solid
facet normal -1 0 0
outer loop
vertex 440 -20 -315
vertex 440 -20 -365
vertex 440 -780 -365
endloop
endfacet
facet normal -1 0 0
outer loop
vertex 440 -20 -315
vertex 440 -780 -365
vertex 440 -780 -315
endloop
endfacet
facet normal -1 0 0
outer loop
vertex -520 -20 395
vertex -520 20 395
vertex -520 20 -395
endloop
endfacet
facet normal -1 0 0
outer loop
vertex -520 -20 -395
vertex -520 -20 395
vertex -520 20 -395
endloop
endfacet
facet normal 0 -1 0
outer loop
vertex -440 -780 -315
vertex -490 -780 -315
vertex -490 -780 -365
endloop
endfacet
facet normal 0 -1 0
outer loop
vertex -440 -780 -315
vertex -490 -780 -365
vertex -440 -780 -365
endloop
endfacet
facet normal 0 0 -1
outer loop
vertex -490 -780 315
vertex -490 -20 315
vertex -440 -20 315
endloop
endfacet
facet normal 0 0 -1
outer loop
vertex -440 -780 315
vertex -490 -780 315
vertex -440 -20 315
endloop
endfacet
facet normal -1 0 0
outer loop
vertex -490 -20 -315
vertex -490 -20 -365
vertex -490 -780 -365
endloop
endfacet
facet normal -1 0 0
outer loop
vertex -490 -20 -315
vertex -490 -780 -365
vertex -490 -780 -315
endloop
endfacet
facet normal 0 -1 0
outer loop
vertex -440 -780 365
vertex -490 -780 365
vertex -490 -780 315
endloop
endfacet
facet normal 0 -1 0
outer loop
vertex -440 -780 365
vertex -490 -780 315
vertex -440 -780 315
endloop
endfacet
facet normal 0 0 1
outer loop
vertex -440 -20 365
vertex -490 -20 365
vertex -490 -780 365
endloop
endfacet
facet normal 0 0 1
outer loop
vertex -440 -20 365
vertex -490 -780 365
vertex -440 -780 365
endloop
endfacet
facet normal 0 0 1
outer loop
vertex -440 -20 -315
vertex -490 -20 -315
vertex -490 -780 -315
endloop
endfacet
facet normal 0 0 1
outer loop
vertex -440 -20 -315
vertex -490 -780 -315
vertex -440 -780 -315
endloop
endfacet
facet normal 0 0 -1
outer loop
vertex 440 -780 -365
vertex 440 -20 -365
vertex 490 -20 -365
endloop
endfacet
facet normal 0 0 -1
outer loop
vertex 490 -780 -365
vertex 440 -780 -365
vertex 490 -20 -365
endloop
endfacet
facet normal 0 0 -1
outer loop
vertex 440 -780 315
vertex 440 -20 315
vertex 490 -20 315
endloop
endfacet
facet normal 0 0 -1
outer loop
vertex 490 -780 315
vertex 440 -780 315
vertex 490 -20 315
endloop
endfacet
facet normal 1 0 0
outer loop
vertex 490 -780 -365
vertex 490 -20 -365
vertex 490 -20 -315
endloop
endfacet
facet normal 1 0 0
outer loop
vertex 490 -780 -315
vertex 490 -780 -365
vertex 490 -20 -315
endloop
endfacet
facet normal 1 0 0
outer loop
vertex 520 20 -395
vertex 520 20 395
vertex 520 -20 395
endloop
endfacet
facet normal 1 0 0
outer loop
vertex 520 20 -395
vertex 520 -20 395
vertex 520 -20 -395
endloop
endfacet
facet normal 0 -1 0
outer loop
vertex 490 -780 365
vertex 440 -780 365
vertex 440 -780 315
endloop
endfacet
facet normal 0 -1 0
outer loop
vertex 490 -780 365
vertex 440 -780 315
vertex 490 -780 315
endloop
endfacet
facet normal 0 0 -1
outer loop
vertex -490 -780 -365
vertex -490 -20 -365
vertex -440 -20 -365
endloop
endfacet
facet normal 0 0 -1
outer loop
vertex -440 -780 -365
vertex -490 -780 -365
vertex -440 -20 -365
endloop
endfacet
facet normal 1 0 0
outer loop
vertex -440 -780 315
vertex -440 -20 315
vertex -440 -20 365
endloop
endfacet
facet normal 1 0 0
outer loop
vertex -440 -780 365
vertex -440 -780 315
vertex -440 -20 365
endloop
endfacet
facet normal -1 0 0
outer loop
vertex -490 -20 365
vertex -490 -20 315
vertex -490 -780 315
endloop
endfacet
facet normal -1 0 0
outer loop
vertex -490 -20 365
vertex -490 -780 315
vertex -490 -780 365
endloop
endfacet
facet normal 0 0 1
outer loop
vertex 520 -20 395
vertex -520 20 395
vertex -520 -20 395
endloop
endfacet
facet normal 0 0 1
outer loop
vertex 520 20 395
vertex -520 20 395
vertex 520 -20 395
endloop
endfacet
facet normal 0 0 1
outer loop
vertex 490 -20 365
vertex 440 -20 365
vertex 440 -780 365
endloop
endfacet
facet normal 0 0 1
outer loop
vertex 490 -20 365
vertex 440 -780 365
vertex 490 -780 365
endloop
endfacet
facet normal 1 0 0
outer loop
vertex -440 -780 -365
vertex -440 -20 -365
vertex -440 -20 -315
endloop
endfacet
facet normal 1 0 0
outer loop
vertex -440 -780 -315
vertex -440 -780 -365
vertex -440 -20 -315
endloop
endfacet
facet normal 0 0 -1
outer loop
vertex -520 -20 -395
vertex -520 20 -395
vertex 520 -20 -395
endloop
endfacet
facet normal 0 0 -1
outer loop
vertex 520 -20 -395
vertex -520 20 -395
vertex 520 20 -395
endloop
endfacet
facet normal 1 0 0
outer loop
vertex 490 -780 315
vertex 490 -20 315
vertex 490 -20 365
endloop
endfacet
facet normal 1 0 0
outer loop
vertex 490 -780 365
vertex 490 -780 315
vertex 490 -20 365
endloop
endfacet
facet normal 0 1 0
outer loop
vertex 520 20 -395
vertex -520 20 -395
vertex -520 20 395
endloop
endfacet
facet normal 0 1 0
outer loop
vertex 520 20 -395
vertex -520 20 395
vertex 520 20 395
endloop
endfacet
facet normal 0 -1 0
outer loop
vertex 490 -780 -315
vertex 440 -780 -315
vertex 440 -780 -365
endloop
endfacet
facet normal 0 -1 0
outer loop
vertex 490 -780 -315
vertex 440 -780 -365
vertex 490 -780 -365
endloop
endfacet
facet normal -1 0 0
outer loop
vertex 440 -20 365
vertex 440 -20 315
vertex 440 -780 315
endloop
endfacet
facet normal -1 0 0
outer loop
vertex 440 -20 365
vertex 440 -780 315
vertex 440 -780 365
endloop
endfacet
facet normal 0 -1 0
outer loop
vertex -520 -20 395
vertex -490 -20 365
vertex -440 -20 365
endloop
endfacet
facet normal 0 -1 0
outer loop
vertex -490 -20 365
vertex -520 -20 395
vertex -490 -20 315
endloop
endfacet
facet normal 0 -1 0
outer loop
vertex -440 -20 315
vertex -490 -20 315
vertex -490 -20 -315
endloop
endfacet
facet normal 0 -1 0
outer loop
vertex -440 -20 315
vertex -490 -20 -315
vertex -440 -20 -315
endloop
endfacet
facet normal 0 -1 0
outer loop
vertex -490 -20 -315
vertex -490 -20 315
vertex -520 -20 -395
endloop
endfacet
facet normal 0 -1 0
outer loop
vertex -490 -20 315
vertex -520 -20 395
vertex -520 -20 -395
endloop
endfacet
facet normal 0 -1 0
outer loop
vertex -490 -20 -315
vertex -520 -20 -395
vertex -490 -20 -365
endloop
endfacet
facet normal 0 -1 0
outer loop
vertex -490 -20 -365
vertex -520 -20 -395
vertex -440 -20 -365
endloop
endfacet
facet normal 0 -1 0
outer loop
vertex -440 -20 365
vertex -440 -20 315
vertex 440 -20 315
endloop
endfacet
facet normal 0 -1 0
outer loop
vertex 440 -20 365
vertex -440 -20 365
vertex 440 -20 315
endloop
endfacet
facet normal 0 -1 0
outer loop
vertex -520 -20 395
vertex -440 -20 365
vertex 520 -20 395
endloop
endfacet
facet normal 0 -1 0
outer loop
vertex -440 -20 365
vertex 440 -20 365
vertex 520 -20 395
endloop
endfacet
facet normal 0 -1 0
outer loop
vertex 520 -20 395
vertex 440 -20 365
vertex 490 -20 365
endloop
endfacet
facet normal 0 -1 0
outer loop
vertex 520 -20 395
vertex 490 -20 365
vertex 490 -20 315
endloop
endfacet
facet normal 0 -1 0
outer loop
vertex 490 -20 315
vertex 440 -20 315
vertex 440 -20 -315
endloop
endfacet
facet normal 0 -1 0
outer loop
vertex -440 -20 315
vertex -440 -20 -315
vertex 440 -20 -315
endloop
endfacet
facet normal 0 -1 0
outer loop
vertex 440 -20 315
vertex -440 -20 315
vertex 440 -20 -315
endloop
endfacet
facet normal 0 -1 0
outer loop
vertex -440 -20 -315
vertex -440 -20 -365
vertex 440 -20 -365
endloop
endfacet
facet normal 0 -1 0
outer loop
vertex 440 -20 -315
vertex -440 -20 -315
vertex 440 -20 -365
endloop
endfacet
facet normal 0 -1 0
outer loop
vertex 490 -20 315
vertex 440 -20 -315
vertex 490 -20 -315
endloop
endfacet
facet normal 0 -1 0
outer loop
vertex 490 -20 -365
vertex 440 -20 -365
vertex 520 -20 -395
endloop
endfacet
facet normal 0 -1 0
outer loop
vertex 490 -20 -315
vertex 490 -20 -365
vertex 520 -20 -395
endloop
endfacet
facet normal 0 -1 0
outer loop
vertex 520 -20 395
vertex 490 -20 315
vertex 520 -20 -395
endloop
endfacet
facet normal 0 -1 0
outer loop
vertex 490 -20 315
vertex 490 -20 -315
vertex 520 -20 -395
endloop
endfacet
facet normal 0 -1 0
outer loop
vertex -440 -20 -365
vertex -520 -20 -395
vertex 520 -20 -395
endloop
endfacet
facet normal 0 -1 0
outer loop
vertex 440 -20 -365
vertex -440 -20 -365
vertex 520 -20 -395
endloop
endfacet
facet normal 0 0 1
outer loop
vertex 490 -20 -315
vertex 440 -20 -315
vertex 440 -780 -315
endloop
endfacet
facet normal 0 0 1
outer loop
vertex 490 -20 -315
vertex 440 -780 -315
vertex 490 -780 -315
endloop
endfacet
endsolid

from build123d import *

# Parameters (mm, degrees)
SKETCH1_W           = 1040
SKETCH1_H           = 790
BOSS_EXTRUDE1_DEPTH = 20
SKETCH2_W           = 50
SKETCH2_H           = 50
BOSS_EXTRUDE2_DEPTH = 760


with BuildPart() as part:
    # Sketch1 → Boss-Extrude1 (new, symmetric)
    with BuildSketch(Plane(origin=(0, 0, 0), x_dir=(1, 0, 0), z_dir=(0, 1, 0))):
        Rectangle(SKETCH1_W, SKETCH1_H)
    extrude(amount=BOSS_EXTRUDE1_DEPTH, both=True)

    # Sketch2 → Boss-Extrude2 (add)
    with BuildSketch(Plane.XZ.offset(20)):
        with Locations((-465, 340)):
            Rectangle(SKETCH2_W, SKETCH2_H)
        with Locations((-465, -340)):
            Rectangle(SKETCH2_W, SKETCH2_H)
        with Locations((465, -340)):
            Rectangle(SKETCH2_W, SKETCH2_H)
        with Locations((465, 340)):
            Rectangle(SKETCH2_W, SKETCH2_H)
    extrude(amount=BOSS_EXTRUDE2_DEPTH)


solid = part.part
